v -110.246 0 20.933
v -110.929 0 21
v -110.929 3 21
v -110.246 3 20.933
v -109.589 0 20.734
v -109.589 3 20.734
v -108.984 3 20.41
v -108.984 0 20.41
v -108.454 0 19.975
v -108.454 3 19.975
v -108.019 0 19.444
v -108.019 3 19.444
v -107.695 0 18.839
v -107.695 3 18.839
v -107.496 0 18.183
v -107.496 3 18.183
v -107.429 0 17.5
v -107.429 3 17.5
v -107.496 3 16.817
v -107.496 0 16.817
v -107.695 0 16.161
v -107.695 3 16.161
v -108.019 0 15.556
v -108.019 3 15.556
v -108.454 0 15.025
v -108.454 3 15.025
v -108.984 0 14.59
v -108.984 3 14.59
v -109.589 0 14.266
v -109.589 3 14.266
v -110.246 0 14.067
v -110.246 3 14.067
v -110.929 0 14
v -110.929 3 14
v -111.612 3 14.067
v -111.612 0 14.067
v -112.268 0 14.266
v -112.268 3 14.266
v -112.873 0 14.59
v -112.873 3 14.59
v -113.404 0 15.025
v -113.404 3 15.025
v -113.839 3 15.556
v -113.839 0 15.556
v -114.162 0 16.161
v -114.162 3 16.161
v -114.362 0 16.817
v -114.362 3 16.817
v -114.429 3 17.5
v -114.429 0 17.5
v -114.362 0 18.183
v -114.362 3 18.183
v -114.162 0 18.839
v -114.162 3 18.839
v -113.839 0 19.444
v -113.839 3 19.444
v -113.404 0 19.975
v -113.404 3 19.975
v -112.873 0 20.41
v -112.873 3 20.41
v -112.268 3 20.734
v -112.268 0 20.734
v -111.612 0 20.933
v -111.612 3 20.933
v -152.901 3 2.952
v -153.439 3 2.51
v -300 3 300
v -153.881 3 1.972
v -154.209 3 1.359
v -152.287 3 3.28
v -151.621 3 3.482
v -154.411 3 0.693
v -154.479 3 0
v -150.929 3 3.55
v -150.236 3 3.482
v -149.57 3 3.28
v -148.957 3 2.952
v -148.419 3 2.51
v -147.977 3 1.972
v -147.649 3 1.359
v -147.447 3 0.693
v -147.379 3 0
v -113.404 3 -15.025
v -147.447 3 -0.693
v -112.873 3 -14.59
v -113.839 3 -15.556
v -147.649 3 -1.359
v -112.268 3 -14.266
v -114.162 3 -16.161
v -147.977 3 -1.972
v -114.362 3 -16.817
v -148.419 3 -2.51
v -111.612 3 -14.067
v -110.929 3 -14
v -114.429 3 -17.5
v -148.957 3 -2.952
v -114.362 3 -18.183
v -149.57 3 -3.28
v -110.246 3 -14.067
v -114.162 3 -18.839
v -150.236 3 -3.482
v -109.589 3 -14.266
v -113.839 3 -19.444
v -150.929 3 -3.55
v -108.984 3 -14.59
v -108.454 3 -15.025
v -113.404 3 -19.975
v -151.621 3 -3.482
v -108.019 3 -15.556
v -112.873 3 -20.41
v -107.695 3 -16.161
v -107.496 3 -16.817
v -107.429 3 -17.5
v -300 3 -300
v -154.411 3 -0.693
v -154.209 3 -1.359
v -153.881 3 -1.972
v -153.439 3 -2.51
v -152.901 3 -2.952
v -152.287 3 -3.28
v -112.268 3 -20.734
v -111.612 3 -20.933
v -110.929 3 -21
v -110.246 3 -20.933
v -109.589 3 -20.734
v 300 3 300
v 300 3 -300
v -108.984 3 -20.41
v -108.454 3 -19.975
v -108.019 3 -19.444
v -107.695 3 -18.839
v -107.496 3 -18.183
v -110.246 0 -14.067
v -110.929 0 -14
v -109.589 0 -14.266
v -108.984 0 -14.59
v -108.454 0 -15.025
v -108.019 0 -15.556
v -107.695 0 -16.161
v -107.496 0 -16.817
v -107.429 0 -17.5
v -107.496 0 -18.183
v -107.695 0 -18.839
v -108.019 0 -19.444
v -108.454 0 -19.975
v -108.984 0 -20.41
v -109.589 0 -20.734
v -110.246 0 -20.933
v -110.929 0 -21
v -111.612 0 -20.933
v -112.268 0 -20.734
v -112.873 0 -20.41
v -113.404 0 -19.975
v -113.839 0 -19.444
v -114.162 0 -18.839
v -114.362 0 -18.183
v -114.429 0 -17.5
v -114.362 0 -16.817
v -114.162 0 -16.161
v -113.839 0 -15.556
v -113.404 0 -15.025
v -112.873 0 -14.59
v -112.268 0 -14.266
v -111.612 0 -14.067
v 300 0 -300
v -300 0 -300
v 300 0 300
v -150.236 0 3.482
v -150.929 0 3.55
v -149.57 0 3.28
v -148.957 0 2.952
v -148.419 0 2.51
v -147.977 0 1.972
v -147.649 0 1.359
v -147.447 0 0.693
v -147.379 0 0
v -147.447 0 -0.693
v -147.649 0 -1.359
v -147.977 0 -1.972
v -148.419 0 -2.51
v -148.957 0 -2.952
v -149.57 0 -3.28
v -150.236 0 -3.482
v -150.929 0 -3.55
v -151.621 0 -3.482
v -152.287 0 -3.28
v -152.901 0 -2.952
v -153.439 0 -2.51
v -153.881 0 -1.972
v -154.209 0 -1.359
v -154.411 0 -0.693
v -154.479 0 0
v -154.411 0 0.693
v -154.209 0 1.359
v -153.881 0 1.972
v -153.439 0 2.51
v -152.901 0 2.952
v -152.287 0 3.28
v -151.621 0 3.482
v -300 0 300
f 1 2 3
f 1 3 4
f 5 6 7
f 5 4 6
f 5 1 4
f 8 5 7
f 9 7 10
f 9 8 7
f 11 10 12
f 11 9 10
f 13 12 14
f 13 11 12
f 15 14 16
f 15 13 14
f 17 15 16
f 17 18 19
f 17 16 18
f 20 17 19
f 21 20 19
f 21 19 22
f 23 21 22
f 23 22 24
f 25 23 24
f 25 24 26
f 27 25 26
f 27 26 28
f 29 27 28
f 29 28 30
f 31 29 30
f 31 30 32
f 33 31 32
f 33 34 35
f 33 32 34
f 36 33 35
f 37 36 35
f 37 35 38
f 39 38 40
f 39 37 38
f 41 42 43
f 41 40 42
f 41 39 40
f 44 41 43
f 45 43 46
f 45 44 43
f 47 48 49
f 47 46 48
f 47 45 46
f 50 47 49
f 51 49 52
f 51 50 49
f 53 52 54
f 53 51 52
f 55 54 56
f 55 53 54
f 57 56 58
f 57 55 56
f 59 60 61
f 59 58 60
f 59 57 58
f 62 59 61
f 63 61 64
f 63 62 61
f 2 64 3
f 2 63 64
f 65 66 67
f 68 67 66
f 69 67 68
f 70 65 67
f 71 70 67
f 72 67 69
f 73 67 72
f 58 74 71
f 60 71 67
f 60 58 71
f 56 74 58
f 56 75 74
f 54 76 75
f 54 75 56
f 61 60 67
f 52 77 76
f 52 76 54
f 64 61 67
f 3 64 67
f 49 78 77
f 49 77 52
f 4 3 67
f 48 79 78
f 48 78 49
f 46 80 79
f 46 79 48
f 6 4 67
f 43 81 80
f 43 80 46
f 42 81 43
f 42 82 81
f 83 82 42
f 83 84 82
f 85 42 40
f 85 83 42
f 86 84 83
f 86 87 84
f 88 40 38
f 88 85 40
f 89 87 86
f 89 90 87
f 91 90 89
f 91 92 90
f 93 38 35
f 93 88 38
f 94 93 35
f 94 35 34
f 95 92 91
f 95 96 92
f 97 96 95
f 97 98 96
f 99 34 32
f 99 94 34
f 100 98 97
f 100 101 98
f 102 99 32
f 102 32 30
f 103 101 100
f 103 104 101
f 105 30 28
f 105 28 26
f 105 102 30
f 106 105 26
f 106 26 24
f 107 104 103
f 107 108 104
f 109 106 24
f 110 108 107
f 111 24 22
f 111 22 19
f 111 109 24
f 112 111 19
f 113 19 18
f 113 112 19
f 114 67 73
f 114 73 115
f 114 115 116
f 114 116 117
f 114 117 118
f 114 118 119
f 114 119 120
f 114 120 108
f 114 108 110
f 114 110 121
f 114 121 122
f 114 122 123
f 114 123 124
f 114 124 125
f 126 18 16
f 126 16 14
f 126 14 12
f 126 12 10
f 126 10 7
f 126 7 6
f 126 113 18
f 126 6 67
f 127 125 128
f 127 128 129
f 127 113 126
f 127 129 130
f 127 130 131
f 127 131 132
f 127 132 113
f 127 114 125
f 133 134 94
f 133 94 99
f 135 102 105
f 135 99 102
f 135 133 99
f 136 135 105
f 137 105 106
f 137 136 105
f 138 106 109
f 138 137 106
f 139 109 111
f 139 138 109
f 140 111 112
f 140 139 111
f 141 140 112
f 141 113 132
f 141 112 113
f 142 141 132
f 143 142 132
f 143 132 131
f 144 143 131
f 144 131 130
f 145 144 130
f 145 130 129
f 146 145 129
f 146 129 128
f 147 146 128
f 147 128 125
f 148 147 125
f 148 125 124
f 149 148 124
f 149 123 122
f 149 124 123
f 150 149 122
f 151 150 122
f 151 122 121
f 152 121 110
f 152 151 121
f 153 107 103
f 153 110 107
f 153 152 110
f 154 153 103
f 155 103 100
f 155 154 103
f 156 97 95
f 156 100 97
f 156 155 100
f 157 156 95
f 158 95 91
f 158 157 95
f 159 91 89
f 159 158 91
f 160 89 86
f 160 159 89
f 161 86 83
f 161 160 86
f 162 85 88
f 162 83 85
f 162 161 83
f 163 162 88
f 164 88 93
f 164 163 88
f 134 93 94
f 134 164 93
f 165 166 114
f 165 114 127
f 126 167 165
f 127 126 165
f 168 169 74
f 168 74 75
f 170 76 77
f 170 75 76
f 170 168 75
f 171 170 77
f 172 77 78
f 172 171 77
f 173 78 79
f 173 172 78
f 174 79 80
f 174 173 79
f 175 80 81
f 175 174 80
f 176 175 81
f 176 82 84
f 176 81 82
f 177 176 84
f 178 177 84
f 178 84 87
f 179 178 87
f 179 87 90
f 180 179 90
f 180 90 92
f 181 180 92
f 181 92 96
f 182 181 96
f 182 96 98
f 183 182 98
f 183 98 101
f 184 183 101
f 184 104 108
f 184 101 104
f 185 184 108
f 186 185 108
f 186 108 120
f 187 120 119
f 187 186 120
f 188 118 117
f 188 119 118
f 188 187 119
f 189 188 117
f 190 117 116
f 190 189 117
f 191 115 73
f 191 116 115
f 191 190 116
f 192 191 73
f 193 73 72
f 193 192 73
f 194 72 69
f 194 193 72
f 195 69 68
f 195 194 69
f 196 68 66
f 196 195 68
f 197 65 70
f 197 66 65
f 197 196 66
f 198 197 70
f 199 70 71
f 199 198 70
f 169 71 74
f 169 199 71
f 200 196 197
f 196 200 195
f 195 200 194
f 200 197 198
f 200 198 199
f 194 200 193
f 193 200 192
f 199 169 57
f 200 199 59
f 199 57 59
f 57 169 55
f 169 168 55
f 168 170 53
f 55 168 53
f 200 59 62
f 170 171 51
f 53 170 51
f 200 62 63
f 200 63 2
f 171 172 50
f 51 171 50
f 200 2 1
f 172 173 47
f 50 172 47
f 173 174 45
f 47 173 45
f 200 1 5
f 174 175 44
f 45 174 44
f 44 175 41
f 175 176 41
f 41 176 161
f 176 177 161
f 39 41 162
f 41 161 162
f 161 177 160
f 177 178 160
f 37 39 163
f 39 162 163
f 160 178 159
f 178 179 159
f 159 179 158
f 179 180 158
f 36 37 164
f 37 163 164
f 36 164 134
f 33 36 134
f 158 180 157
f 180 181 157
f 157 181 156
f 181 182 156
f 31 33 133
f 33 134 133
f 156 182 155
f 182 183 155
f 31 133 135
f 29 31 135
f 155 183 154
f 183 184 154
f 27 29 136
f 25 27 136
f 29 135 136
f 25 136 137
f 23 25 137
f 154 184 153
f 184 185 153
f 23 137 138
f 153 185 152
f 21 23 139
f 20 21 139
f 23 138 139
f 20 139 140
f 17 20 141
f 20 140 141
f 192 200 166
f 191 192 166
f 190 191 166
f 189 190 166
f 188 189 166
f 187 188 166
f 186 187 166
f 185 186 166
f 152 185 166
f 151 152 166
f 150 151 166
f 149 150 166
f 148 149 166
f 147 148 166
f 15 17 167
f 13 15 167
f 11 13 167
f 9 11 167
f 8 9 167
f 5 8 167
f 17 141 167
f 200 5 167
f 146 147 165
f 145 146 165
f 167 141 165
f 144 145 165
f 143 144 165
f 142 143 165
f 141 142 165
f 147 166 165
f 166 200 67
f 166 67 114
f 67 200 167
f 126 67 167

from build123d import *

# Parameters (mm, degrees)
SKETCH1_W               = 600
SKETCH1_H               = 600
BOSS_EXTRUDE1_DEPTH     = 3
CUT_EXTRUDE1_DEPTH      = 425.274675181
CUT_EXTRUDE1_DEPTH_BACK = 425.274675181
SKETCH2_R               = 3.5
CUT_EXTRUDE2_DEPTH      = 425.274675181
CUT_EXTRUDE2_DEPTH_BACK = 425.274675181
SKETCH3_R               = 3.55


with BuildPart() as part:
    # Sketch1 → Boss-Extrude1 (new body)
    with BuildSketch(Plane(origin=(0, 0, 0), x_dir=(1, 0, 0), z_dir=(0, 1, 0))):
        Rectangle(SKETCH1_W, SKETCH1_H)
    extrude(amount=BOSS_EXTRUDE1_DEPTH)

    # Sketch2 → Cut-Extrude1 (cut, two sides: drawn at the far end of the back side and taken through both)
    with BuildSketch(Plane(origin=(0, 3, 0), x_dir=(1, 0, 0), z_dir=(0, 1, 0)).offset(-CUT_EXTRUDE1_DEPTH_BACK)):
        with Locations(Location((-110.928868976, -17.5, 0), (0, 0, 270))):
            Circle(SKETCH2_R)
        with Locations(Location((-110.928868976, 17.5, 0), (0, 0, 270))):
            Circle(SKETCH2_R)
    extrude(amount=CUT_EXTRUDE1_DEPTH + CUT_EXTRUDE1_DEPTH_BACK, mode=Mode.SUBTRACT)

    # Sketch3 → Cut-Extrude2 (cut, two sides: drawn at the far end of the back side and taken through both)
    with BuildSketch(Plane(origin=(0, 3, 0), x_dir=(1, 0, 0), z_dir=(0, 1, 0)).offset(-CUT_EXTRUDE2_DEPTH_BACK)):
        with Locations(Location((-150.928868976, 0, 0), (0, 0, 270))):
            Circle(SKETCH3_R)
    extrude(amount=CUT_EXTRUDE2_DEPTH + CUT_EXTRUDE2_DEPTH_BACK, mode=Mode.SUBTRACT)


solid = part.part
